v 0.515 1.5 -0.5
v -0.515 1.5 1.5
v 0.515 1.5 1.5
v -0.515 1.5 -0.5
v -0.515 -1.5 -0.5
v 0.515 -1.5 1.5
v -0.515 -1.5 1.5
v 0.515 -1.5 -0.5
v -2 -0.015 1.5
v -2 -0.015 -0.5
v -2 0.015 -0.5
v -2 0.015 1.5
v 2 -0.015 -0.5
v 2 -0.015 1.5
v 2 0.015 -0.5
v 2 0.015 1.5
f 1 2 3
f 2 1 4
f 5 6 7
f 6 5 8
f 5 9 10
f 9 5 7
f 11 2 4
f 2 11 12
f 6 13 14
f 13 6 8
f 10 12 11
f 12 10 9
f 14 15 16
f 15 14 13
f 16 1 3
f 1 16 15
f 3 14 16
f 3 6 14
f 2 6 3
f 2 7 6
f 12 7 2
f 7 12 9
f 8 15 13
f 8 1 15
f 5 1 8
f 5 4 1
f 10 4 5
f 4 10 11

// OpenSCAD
$fn=5;
union()
{
	hull()
	{
		hull()
		{
			translate([-0.515,-0.014999986,0])
			{
				rotate(0,[0,0,1])
				{
					cube([0.015,0.015,0.015]);
				}
			}
			translate([-0.515,-0.014999986,1.485])
			{
				rotate(0,[0,0,1])
				{
					cube([0.015,0.015,0.015]);
				}
			}
		}
		hull()
		{
			translate([-0.515,-1.5,0])
			{
				rotate(0,[0,0,1])
				{
					cube([0.015,0.015,0.015]);
				}
			}
			translate([-0.515,-1.5,1.485])
			{
				rotate(0,[0,0,1])
				{
					cube([0.015,0.015,0.015]);
				}
			}
		}
		hull()
		{
			translate([-2,-0.014999986,0])
			{
				rotate(0,[0,0,1])
				{
					cube([0.015,0.015,0.015]);
				}
			}
			translate([-2,-0.014999986,1.485])
			{
				rotate(0,[0,0,1])
				{
					cube([0.015,0.015,0.015]);
				}
			}
		}
		hull()
		{
			translate([0.5,-0.014999986,0])
			{
				rotate(0,[0,0,1])
				{
					cube([0.015,0.015,0.015]);
				}
			}
			translate([0.5,-0.014999986,1.485])
			{
				rotate(0,[0,0,1])
				{
					cube([0.015,0.015,0.015]);
				}
			}
		}
		hull()
		{
			translate([0.5,-1.5,0])
			{
				rotate(0,[0,0,1])
				{
					cube([0.015,0.015,0.015]);
				}
			}
			translate([0.5,-1.5,1.485])
			{
				rotate(0,[0,0,1])
				{
					cube([0.015,0.015,0.015]);
				}
			}
		}
		hull()
		{
			translate([1.985,-0.014999986,0])
			{
				rotate(0,[0,0,1])
				{
					cube([0.015,0.015,0.015]);
				}
			}
			translate([1.985,-0.014999986,1.485])
			{
				rotate(0,[0,0,1])
				{
					cube([0.015,0.015,0.015]);
				}
			}
		}
		hull()
		{
			translate([-0.515,0,0])
			{
				rotate(0,[0,0,1])
				{
					cube([0.015,0.015,0.015]);
				}
			}
			translate([-0.515,0,1.485])
			{
				rotate(0,[0,0,1])
				{
					cube([0.015,0.015,0.015]);
				}
			}
		}
		hull()
		{
			translate([-2,0,0])
			{
				rotate(0,[0,0,1])
				{
					cube([0.015,0.015,0.015]);
				}
			}
			translate([-2,0,1.485])
			{
				rotate(0,[0,0,1])
				{
					cube([0.015,0.015,0.015]);
				}
			}
		}
		hull()
		{
			translate([-0.515,1.485,0])
			{
				rotate(0,[0,0,1])
				{
					cube([0.015,0.015,0.015]);
				}
			}
			translate([-0.515,1.485,1.485])
			{
				rotate(0,[0,0,1])
				{
					cube([0.015,0.015,0.015]);
				}
			}
		}
		hull()
		{
			translate([0.5,0,0])
			{
				rotate(0,[0,0,1])
				{
					cube([0.015,0.015,0.015]);
				}
			}
			translate([0.5,0,1.485])
			{
				rotate(0,[0,0,1])
				{
					cube([0.015,0.015,0.015]);
				}
			}
		}
		hull()
		{
			translate([1.985,0,0])
			{
				rotate(0,[0,0,1])
				{
					cube([0.015,0.015,0.015]);
				}
			}
			translate([1.985,0,1.485])
			{
				rotate(0,[0,0,1])
				{
					cube([0.015,0.015,0.015]);
				}
			}
		}
		hull()
		{
			translate([0.5,1.485,0])
			{
				rotate(0,[0,0,1])
				{
					cube([0.015,0.015,0.015]);
				}
			}
			translate([0.5,1.485,1.485])
			{
				rotate(0,[0,0,1])
				{
					cube([0.015,0.015,0.015]);
				}
			}
		}
	}
	hull()
	{
		hull()
		{
			translate([-0.515,-0.014999986,-0.5])
			{
				rotate(0,[0,0,1])
				{
					cube([0.015,0.015,0.015]);
				}
			}
			translate([-0.515,-0.014999986,0.985])
			{
				rotate(0,[0,0,1])
				{
					cube([0.015,0.015,0.015]);
				}
			}
		}
		hull()
		{
			translate([-0.515,-1.5,-0.5])
			{
				rotate(0,[0,0,1])
				{
					cube([0.015,0.015,0.015]);
				}
			}
			translate([-0.515,-1.5,0.985])
			{
				rotate(0,[0,0,1])
				{
					cube([0.015,0.015,0.015]);
				}
			}
		}
		hull()
		{
			translate([-2,-0.014999986,-0.5])
			{
				rotate(0,[0,0,1])
				{
					cube([0.015,0.015,0.015]);
				}
			}
			translate([-2,-0.014999986,0.985])
			{
				rotate(0,[0,0,1])
				{
					cube([0.015,0.015,0.015]);
				}
			}
		}
		hull()
		{
			translate([0.5,-0.014999986,-0.5])
			{
				rotate(0,[0,0,1])
				{
					cube([0.015,0.015,0.015]);
				}
			}
			translate([0.5,-0.014999986,0.985])
			{
				rotate(0,[0,0,1])
				{
					cube([0.015,0.015,0.015]);
				}
			}
		}
		hull()
		{
			translate([0.5,-1.5,-0.5])
			{
				rotate(0,[0,0,1])
				{
					cube([0.015,0.015,0.015]);
				}
			}
			translate([0.5,-1.5,0.985])
			{
				rotate(0,[0,0,1])
				{
					cube([0.015,0.015,0.015]);
				}
			}
		}
		hull()
		{
			translate([1.985,-0.014999986,-0.5])
			{
				rotate(0,[0,0,1])
				{
					cube([0.015,0.015,0.015]);
				}
			}
			translate([1.985,-0.014999986,0.985])
			{
				rotate(0,[0,0,1])
				{
					cube([0.015,0.015,0.015]);
				}
			}
		}
		hull()
		{
			translate([-0.515,0,-0.5])
			{
				rotate(0,[0,0,1])
				{
					cube([0.015,0.015,0.015]);
				}
			}
			translate([-0.515,0,0.985])
			{
				rotate(0,[0,0,1])
				{
					cube([0.015,0.015,0.015]);
				}
			}
		}
		hull()
		{
			translate([-2,0,-0.5])
			{
				rotate(0,[0,0,1])
				{
					cube([0.015,0.015,0.015]);
				}
			}
			translate([-2,0,0.985])
			{
				rotate(0,[0,0,1])
				{
					cube([0.015,0.015,0.015]);
				}
			}
		}
		hull()
		{
			translate([-0.515,1.485,-0.5])
			{
				rotate(0,[0,0,1])
				{
					cube([0.015,0.015,0.015]);
				}
			}
			translate([-0.515,1.485,0.985])
			{
				rotate(0,[0,0,1])
				{
					cube([0.015,0.015,0.015]);
				}
			}
		}
		hull()
		{
			translate([0.5,0,-0.5])
			{
				rotate(0,[0,0,1])
				{
					cube([0.015,0.015,0.015]);
				}
			}
			translate([0.5,0,0.985])
			{
				rotate(0,[0,0,1])
				{
					cube([0.015,0.015,0.015]);
				}
			}
		}
		hull()
		{
			translate([1.985,0,-0.5])
			{
				rotate(0,[0,0,1])
				{
					cube([0.015,0.015,0.015]);
				}
			}
			translate([1.985,0,0.985])
			{
				rotate(0,[0,0,1])
				{
					cube([0.015,0.015,0.015]);
				}
			}
		}
		hull()
		{
			translate([0.5,1.485,-0.5])
			{
				rotate(0,[0,0,1])
				{
					cube([0.015,0.015,0.015]);
				}
			}
			translate([0.5,1.485,0.985])
			{
				rotate(0,[0,0,1])
				{
					cube([0.015,0.015,0.015]);
				}
			}
		}
	}
}
